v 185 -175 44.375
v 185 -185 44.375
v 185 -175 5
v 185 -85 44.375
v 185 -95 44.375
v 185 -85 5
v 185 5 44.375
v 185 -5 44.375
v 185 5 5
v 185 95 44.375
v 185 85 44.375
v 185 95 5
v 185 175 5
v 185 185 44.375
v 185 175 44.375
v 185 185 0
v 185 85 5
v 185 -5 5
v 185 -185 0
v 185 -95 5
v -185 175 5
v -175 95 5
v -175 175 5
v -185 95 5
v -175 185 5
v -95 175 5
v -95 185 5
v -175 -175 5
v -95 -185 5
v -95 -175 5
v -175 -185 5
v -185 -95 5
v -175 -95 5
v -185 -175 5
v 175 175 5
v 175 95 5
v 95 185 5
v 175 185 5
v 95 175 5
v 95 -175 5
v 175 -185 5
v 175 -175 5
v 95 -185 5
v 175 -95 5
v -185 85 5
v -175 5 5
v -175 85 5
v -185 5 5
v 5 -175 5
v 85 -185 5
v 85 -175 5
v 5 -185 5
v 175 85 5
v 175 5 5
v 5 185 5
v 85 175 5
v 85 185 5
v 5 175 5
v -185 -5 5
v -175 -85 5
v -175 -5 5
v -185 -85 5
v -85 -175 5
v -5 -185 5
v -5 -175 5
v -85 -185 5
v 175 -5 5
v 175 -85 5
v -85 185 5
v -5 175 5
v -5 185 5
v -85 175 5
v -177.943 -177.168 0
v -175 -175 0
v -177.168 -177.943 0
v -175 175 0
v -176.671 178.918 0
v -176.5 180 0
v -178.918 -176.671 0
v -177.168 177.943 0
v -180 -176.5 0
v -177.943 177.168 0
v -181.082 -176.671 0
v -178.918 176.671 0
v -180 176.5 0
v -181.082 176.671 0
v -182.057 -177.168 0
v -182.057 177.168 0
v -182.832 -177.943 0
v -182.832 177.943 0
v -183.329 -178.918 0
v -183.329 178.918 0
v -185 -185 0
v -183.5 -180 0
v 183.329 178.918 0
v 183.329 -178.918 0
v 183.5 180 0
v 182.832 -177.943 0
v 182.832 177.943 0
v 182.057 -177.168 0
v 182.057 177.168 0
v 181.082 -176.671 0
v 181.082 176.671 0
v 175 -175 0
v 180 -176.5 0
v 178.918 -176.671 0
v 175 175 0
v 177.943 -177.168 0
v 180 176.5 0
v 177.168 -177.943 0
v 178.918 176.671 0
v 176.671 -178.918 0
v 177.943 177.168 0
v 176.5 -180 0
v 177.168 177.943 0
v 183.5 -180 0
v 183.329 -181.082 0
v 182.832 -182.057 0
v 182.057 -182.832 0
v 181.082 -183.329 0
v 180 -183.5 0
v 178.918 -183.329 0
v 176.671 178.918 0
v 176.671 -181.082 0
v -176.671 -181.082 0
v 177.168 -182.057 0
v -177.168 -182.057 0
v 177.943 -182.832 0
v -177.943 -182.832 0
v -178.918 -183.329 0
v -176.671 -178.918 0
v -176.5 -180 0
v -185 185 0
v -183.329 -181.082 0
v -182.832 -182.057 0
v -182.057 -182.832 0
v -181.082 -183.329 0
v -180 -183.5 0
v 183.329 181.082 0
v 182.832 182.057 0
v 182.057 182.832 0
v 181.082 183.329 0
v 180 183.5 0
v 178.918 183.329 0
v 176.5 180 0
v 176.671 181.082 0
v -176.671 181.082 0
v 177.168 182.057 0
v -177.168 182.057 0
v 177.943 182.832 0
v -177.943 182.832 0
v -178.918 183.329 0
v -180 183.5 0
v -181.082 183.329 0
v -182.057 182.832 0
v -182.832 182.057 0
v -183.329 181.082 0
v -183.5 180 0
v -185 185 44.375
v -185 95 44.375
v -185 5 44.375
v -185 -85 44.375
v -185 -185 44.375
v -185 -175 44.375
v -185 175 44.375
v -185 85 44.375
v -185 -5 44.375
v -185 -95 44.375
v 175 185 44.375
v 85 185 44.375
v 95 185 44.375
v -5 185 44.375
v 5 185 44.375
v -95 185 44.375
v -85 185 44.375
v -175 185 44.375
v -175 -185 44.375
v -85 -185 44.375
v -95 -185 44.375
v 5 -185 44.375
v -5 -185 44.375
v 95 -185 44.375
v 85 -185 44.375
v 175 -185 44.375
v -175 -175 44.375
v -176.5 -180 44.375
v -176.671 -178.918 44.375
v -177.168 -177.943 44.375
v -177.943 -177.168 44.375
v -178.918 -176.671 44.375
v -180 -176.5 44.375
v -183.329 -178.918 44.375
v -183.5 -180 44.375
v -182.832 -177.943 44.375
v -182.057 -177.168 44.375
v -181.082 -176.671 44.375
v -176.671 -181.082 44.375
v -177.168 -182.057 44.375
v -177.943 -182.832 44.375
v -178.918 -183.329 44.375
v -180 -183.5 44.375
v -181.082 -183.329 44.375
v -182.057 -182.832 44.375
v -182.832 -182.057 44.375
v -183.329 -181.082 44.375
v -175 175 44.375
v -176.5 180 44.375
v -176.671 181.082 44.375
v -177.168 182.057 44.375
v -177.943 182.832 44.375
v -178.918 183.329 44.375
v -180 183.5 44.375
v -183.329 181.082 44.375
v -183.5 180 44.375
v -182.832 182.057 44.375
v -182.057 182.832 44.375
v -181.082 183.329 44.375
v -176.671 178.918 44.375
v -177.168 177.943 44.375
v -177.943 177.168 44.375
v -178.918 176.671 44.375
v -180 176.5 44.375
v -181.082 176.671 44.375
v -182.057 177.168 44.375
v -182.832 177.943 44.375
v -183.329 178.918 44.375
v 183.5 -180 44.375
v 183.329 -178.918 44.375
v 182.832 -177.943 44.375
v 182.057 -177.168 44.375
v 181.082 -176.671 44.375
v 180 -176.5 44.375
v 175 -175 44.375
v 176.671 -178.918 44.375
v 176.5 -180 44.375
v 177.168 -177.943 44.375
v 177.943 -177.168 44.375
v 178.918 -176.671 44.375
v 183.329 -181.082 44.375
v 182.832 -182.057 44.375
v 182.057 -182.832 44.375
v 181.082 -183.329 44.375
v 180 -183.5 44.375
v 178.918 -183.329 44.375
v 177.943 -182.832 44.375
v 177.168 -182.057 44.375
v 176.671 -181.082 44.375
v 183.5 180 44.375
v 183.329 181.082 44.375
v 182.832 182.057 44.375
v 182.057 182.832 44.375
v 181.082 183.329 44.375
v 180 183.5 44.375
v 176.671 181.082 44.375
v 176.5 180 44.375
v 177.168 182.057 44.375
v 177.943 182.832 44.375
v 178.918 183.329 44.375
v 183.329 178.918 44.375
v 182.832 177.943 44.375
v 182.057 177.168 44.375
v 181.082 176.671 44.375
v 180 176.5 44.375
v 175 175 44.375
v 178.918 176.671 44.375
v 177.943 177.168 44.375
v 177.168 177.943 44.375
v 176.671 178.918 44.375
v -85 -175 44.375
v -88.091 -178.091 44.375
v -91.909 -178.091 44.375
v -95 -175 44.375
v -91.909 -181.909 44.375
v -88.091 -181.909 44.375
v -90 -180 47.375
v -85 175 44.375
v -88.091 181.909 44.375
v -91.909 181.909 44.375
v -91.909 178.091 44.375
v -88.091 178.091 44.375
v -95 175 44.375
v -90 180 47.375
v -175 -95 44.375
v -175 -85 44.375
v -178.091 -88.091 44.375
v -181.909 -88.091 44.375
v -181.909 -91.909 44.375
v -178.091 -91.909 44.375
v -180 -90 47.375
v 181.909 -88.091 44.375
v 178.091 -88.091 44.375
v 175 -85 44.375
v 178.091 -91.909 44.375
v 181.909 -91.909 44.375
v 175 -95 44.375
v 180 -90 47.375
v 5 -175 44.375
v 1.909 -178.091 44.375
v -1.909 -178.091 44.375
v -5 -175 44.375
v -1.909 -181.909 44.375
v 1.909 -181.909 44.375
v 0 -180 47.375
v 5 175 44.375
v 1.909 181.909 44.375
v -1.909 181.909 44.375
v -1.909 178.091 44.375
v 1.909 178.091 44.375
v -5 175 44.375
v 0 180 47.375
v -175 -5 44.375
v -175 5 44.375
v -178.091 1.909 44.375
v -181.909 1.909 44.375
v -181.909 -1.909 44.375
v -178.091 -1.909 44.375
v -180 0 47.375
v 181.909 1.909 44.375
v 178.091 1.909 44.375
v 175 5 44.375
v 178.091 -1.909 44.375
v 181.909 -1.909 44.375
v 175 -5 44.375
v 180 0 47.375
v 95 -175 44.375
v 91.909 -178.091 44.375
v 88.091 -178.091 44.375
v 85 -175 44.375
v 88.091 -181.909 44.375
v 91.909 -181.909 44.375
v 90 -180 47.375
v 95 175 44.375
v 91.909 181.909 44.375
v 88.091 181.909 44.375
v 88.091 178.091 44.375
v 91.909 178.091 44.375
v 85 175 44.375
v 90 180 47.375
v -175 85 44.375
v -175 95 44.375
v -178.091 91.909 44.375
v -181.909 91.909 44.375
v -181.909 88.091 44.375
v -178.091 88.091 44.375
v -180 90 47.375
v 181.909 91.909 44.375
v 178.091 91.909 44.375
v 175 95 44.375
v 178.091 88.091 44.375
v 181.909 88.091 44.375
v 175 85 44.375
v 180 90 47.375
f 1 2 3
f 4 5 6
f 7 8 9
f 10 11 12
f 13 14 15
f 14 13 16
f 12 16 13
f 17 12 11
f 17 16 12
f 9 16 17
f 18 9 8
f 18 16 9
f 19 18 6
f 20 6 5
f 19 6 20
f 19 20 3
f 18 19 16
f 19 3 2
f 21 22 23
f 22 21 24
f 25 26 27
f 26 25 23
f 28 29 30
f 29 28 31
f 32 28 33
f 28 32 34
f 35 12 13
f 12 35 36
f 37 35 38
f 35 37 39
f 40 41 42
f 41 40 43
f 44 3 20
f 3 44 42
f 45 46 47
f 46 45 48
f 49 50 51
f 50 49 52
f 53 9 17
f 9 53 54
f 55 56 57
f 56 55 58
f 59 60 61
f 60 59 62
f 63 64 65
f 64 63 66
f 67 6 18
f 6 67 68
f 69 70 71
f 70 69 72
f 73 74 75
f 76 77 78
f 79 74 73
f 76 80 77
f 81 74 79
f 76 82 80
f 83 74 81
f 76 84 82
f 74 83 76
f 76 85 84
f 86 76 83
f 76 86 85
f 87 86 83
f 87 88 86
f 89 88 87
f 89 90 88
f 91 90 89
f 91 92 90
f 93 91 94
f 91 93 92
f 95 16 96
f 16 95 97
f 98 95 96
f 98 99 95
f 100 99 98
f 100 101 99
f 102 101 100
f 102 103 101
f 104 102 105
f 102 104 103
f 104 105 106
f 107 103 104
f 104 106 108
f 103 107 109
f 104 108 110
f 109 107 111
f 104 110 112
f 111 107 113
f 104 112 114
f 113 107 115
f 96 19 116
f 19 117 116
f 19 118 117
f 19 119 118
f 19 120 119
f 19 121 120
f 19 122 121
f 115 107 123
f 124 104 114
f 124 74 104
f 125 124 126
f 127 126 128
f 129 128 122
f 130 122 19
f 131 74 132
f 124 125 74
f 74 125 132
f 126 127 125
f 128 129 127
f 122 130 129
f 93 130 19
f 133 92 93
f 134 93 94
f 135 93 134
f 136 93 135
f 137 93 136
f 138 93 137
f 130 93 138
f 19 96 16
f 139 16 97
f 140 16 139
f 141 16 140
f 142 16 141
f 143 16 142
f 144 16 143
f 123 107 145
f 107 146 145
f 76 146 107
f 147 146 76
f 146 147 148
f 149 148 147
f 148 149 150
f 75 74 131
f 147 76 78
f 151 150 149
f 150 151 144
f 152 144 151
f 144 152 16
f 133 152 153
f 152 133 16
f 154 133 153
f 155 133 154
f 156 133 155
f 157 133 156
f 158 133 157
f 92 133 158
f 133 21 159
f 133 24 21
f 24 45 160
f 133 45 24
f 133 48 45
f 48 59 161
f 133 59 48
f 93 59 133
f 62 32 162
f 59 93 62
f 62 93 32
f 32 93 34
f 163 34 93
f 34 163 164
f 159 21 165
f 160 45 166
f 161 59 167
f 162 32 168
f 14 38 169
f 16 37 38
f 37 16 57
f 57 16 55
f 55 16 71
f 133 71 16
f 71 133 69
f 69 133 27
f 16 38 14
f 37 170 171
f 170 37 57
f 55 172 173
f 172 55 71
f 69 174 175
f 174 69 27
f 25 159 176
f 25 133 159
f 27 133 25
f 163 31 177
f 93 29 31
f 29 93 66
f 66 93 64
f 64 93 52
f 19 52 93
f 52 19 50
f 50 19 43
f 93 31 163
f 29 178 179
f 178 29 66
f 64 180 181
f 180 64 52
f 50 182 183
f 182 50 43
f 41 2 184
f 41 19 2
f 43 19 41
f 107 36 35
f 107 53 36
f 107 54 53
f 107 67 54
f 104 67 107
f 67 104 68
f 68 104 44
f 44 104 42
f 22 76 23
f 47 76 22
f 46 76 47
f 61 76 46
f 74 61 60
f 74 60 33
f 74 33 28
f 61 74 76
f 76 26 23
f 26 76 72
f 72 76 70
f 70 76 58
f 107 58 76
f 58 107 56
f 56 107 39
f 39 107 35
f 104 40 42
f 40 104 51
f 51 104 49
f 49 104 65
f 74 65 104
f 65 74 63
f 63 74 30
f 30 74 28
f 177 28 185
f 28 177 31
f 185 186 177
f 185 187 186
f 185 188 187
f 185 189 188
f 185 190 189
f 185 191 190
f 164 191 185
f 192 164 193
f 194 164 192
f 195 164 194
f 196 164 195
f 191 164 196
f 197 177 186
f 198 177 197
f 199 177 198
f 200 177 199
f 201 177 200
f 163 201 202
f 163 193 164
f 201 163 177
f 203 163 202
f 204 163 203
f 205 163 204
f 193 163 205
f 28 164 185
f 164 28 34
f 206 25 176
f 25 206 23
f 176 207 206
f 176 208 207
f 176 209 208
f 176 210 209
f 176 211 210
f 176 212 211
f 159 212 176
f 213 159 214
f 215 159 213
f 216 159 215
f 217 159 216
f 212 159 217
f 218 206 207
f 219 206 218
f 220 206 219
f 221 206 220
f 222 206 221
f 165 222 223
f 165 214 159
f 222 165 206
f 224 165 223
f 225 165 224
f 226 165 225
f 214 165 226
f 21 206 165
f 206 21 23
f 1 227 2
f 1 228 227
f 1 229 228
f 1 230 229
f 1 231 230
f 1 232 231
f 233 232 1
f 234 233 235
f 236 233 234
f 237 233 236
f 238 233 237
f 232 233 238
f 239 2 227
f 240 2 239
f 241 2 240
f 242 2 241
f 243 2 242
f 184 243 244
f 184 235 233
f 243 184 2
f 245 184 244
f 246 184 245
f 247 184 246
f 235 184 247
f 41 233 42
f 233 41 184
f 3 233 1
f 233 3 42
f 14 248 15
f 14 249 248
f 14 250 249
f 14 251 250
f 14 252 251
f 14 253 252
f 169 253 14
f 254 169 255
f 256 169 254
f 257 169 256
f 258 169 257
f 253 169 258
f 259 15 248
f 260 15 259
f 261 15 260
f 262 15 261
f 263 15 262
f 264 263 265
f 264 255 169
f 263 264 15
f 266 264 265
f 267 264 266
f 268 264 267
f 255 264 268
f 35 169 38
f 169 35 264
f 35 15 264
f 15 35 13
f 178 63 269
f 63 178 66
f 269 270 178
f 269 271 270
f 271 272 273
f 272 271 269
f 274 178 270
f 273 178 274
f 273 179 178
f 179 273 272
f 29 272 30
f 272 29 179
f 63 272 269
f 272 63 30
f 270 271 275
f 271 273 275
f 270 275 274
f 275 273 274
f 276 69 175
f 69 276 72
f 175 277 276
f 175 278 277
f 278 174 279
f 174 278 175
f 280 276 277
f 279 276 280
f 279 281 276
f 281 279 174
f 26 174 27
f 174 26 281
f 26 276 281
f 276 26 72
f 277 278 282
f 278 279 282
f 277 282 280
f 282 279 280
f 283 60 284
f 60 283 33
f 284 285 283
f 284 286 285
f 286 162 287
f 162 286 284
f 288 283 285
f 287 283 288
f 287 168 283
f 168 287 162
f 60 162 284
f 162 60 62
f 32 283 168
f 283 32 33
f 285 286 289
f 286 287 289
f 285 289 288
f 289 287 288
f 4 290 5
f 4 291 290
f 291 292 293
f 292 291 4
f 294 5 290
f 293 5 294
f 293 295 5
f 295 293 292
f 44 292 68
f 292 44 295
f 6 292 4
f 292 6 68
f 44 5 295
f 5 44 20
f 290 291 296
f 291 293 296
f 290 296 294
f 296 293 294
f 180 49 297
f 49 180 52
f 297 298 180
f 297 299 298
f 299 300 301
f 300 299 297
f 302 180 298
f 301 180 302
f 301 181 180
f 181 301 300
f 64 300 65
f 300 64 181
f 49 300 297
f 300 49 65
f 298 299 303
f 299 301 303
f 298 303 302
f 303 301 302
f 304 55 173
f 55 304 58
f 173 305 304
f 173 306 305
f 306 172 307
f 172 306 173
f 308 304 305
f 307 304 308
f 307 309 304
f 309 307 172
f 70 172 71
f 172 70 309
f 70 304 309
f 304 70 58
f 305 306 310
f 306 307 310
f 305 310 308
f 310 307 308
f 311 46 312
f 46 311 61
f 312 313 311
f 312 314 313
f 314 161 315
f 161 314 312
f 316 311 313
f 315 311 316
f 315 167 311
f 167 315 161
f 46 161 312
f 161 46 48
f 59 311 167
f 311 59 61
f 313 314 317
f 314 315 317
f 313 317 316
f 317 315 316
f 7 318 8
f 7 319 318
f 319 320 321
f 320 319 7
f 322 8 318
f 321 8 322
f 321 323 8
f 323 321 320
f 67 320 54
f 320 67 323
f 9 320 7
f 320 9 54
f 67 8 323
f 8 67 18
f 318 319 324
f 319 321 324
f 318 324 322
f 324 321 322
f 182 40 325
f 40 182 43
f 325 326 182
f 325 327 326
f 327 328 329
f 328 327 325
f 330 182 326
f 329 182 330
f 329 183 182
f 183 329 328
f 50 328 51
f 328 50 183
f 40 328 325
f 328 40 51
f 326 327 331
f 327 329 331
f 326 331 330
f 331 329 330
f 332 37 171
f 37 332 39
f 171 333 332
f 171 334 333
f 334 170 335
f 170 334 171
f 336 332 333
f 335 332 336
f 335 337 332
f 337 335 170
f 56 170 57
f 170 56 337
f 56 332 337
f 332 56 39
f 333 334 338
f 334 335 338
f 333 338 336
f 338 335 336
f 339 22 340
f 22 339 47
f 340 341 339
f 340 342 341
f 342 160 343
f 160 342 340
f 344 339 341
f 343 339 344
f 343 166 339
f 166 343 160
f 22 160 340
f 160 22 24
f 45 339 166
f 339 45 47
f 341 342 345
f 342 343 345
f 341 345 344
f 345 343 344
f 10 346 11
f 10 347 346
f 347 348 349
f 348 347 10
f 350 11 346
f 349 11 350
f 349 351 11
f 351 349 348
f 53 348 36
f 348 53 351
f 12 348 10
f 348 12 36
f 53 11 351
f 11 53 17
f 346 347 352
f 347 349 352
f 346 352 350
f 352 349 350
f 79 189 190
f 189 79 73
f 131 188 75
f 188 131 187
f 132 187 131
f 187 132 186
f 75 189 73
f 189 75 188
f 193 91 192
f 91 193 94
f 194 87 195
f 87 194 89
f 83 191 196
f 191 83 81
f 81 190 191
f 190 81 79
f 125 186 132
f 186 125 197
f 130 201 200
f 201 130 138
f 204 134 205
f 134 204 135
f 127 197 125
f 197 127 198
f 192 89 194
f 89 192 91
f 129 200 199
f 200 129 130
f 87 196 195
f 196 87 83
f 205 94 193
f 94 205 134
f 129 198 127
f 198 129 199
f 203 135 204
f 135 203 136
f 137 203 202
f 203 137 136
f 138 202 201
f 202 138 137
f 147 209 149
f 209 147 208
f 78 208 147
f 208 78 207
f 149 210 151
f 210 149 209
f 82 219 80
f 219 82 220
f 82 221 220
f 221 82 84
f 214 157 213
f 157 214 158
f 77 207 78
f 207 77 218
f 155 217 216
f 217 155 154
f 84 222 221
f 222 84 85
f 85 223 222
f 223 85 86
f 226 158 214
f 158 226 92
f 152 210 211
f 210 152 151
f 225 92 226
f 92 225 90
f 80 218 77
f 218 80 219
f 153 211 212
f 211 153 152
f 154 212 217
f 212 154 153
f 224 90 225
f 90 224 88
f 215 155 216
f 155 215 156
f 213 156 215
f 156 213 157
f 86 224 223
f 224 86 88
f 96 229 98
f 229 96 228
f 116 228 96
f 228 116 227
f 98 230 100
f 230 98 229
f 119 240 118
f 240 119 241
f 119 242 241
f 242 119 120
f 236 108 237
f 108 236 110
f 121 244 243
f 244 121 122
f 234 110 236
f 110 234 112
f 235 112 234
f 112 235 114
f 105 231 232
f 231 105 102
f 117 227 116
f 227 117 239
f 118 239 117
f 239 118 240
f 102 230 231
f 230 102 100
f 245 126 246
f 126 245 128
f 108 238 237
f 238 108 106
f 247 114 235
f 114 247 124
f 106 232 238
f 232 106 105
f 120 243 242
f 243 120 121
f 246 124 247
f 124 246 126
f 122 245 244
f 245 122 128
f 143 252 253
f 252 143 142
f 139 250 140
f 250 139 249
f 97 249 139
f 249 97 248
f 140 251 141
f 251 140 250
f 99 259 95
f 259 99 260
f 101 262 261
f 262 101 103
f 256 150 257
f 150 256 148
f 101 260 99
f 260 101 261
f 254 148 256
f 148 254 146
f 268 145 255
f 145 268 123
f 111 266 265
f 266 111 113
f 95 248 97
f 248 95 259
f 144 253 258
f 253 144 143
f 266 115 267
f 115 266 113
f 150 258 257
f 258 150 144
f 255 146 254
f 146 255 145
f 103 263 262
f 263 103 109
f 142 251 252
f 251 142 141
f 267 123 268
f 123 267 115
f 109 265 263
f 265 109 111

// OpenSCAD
module pyramid_pin() {
    rotate([0,0,45]) cylinder(h=3, d1=5.4, d2=0, $fn=4);
}

module hemi_male() {
    bar_h = 39.375;
    union() {
        difference() {
            union() {
                // Base Ring
                translate([0,0,2.5]) difference() {
                    cube([370, 370, 5], center=true);
                    cube([350, 350, 5.1], center=true);
                }
                // Bars
                // Corners
                for (x = [-180, 180]) {
                    for (y = [-180, 180]) {
                        translate([x, y, 5 + bar_h/2]) cube([10, 10, bar_h], center=true);
                    }
                }
                // Intermediates
                for (i = [-90, 0, 90]) {
                    for (pos = [[i, -180], [i, 180], [-180, i], [180, i]]) {
                         translate([pos[0], pos[1], 5 + bar_h/2]) cube([10, 10, bar_h], center=true);
                         // Male Pins
                         translate([pos[0], pos[1], 5 + bar_h]) pyramid_pin();
                    }
                }
            }
            // Corner Holes
            for (x = [-180, 180]) {
                for (y = [-180, 180]) {
                    translate([x, y, -1]) cylinder(h=100, d=7, $fn=20);
                }
            }
        }
    }
}

hemi_male();
